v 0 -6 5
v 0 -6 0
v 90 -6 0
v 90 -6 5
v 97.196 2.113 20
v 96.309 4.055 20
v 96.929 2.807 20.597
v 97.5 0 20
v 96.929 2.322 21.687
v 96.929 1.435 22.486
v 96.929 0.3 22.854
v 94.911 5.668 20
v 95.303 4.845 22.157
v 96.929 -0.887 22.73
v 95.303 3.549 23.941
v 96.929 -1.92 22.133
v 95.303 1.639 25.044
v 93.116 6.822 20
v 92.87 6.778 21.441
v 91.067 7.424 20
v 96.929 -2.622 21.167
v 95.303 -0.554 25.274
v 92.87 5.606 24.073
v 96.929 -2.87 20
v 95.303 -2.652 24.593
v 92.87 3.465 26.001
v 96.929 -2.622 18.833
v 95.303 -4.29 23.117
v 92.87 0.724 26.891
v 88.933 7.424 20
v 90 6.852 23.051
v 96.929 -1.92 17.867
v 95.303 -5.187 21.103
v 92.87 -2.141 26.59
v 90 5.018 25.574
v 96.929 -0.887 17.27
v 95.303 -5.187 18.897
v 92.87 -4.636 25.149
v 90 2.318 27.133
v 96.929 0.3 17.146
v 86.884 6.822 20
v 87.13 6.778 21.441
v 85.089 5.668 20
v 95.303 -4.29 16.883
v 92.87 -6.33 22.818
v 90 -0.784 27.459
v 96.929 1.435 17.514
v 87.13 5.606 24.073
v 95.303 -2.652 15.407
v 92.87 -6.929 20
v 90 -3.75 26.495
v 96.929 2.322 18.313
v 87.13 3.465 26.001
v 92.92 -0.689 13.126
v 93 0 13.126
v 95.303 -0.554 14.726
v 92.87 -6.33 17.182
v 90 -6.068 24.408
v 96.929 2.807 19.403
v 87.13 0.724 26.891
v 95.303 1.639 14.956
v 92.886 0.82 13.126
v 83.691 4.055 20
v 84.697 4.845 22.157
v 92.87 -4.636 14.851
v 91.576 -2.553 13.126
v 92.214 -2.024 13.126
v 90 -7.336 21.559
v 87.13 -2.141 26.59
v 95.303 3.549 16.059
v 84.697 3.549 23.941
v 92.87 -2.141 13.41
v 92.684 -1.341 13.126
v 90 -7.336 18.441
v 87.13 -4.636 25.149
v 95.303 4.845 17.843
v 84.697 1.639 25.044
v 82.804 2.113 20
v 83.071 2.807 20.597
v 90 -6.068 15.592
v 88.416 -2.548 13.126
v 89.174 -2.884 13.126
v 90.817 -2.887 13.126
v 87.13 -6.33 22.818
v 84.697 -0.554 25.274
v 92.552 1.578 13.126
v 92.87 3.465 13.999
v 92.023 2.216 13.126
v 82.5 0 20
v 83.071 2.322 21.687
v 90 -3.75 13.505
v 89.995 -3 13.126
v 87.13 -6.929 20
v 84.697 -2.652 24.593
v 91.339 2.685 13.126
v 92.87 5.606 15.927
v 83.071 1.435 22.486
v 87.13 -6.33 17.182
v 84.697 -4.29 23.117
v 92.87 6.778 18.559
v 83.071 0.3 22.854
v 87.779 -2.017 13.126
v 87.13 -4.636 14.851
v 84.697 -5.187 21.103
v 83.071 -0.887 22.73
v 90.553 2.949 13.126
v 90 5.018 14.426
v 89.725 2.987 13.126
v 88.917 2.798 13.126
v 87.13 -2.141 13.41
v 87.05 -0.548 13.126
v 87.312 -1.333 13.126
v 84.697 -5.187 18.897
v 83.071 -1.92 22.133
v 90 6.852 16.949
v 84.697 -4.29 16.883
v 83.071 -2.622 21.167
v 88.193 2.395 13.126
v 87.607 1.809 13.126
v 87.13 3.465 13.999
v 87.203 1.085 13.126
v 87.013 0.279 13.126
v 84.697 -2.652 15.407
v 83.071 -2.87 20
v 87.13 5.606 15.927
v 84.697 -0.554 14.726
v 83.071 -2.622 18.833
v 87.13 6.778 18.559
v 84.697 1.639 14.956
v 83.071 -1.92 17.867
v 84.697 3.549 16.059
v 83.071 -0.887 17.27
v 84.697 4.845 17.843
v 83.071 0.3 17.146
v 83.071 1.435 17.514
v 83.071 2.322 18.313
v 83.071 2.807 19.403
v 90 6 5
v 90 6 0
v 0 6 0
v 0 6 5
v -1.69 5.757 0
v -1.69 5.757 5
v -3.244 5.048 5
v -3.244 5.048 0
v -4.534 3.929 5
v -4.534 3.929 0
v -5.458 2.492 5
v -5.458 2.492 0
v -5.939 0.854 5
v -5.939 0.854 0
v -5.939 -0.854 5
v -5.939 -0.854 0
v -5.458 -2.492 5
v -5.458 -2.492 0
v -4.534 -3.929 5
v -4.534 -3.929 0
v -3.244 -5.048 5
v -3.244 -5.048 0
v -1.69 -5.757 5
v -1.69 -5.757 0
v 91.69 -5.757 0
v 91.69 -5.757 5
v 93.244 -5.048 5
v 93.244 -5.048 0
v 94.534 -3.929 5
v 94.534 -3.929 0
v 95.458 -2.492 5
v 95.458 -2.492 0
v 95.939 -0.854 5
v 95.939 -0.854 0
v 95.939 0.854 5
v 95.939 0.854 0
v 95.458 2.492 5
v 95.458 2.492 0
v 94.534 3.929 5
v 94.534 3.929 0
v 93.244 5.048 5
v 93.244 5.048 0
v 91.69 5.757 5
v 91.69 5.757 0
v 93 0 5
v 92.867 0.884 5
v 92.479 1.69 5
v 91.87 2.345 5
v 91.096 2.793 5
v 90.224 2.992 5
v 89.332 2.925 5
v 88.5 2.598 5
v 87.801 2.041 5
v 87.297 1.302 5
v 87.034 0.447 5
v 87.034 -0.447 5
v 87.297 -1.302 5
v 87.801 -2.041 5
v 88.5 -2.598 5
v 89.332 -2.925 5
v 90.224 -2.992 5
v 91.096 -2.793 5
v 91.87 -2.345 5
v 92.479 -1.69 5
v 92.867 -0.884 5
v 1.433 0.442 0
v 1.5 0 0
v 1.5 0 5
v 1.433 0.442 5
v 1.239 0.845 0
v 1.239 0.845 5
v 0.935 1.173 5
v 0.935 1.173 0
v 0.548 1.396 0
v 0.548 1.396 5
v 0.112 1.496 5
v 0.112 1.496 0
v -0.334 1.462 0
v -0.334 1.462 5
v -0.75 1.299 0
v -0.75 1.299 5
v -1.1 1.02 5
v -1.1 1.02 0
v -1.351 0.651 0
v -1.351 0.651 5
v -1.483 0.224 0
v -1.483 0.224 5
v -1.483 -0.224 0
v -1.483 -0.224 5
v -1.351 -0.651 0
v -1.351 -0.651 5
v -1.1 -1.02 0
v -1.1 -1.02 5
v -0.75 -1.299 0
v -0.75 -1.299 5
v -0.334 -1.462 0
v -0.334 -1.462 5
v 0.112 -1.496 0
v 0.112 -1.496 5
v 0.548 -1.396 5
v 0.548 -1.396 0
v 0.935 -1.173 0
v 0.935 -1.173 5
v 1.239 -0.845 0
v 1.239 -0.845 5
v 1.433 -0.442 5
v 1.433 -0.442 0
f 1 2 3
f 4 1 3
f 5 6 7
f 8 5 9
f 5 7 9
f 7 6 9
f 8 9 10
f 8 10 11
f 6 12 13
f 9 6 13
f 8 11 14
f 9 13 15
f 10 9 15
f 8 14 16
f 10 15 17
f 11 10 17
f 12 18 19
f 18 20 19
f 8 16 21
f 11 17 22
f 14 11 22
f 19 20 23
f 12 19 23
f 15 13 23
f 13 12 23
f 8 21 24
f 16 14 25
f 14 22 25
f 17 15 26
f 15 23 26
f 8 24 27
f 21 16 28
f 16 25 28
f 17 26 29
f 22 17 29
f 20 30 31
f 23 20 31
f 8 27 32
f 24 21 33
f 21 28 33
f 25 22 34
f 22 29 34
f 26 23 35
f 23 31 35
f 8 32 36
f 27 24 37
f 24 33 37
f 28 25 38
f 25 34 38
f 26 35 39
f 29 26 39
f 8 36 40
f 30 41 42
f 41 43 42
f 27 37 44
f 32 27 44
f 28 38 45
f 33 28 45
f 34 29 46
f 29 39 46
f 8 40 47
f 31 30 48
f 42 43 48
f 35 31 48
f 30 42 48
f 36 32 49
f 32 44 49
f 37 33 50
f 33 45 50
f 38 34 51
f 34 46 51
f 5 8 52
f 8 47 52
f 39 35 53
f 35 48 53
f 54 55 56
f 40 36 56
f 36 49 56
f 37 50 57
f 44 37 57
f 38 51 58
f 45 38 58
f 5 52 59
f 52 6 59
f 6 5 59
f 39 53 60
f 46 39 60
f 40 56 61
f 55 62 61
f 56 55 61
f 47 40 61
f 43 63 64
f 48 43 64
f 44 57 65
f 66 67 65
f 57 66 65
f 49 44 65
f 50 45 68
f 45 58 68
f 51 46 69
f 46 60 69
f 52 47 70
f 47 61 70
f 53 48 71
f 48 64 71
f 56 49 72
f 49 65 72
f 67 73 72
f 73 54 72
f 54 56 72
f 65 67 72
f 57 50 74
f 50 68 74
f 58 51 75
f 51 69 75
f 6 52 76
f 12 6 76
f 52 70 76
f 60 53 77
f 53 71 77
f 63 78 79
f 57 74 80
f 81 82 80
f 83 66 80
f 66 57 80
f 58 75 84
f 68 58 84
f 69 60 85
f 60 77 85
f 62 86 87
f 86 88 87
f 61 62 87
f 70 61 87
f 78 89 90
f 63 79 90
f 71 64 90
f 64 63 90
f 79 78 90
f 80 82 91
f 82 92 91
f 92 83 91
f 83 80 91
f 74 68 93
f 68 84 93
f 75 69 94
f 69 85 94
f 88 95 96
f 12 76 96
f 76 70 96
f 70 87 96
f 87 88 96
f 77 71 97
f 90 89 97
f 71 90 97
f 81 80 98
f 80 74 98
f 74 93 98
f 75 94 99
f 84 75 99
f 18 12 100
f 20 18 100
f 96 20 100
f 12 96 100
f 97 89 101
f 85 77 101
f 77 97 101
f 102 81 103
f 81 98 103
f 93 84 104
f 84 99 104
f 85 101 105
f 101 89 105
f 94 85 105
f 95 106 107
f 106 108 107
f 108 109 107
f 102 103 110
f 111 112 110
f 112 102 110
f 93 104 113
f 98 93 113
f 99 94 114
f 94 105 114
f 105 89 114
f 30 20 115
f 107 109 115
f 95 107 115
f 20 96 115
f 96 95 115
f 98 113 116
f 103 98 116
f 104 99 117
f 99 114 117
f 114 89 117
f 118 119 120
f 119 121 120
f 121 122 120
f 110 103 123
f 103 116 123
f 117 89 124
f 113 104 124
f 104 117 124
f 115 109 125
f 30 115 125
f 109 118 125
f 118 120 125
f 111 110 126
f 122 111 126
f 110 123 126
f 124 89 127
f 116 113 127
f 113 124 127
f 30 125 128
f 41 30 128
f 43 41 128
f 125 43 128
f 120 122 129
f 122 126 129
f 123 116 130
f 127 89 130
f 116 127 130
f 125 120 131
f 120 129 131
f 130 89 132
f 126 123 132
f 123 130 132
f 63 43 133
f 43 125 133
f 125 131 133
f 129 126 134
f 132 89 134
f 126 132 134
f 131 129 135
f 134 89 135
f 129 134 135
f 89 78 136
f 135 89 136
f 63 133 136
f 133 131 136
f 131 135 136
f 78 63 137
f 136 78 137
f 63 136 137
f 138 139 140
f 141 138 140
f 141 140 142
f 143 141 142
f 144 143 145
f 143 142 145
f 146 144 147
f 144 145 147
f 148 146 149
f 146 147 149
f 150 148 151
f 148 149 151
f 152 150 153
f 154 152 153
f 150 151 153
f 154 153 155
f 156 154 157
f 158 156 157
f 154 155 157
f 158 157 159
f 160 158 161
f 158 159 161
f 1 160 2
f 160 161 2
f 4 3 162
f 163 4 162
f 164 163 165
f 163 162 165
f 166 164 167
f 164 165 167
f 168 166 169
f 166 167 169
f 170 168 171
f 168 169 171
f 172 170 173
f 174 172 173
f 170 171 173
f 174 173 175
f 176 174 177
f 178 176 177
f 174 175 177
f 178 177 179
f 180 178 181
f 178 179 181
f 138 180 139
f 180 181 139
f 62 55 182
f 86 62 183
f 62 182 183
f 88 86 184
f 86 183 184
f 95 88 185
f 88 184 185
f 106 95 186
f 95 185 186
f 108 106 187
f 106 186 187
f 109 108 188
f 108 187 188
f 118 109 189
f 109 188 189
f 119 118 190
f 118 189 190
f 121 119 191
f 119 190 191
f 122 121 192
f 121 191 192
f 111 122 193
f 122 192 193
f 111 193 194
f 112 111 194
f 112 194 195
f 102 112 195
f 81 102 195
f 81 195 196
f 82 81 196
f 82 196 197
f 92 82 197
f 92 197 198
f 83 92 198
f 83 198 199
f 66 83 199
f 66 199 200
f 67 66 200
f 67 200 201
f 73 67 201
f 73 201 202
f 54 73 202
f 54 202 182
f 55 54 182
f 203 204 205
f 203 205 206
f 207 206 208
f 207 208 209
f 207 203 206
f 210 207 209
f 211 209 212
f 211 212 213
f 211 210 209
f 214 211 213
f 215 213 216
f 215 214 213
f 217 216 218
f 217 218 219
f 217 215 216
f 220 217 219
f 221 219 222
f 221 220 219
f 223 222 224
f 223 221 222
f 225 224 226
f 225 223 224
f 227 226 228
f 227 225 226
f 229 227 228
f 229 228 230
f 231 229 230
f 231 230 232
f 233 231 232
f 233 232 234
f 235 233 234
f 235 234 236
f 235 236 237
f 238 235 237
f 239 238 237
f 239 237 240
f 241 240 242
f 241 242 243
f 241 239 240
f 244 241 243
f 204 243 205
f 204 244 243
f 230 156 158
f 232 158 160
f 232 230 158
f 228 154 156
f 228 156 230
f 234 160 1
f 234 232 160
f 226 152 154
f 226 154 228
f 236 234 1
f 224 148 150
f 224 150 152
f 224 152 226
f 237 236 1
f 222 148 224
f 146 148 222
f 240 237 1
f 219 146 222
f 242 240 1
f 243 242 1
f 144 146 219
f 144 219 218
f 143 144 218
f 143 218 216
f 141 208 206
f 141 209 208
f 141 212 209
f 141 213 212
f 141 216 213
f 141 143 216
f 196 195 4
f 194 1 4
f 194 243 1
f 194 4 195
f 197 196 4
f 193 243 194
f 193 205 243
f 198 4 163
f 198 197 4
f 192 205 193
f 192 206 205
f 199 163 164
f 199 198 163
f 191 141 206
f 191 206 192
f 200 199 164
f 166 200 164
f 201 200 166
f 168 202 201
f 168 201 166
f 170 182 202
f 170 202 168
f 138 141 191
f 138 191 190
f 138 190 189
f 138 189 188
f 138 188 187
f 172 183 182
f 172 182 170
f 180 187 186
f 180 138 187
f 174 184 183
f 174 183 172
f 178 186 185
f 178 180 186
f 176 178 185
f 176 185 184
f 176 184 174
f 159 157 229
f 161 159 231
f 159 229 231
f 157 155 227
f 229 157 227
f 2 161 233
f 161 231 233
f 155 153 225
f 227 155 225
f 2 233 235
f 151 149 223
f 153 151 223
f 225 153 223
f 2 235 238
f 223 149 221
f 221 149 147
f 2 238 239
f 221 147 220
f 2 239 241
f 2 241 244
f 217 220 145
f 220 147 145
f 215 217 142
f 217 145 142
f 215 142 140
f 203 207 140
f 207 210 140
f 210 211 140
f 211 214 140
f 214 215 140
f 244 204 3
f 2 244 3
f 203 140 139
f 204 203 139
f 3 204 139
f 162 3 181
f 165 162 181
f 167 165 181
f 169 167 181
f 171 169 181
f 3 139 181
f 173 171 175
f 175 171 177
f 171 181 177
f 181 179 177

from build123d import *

# Parameters (mm, degrees)
SKETCH1_R           = 1.5
BOSS_EXTRUDE1_DEPTH = 5
FILLET3_R           = 1
BOSS_EXTRUDE2_START = -5
SKETCH2_R           = 3
BOSS_EXTRUDE2_DEPTH = 20


with BuildPart() as part:
    # Sketch1 → Boss-Extrude1 (new body)
    with BuildSketch(Plane.XY):
        with BuildLine():
            ThreePointArc((0, 6), (-6, 0), (0, -6))
            Line((0, -6), (90, -6))
            ThreePointArc((90, -6), (96, 0), (90, 6))
            Line((90, 6), (0, 6))
        make_face()
        Circle(SKETCH1_R, mode=Mode.SUBTRACT)
        with Locations((90, 0)):
            Circle(SKETCH1_R, mode=Mode.SUBTRACT)
    extrude(amount=BOSS_EXTRUDE1_DEPTH)

    # Fillet3
    fillet3_edges = [part.edges().sort_by_distance(p)[0] for p in [
        (88.5, 0, 0),
    ]]
    fillet(fillet3_edges, radius=FILLET3_R)

    # Sketch2 → Boss-Extrude2 (add)
    with BuildSketch(Plane.XY.offset(5).offset(BOSS_EXTRUDE2_START)):
        with Locations((90, 0)):
            Circle(SKETCH2_R)
    extrude(amount=BOSS_EXTRUDE2_DEPTH)

    # Sketch3 → Revolve1 (revolve)
    with BuildSketch(Plane.XY.offset(20)):
        with BuildLine():
            Line((82.5, 0), (97.5, 0))
            ThreePointArc((97.5, 0), (90, 7.5), (82.5, 0))
        make_face()
    revolve(axis=Axis((90, 0, 20), (1, 0, 0)))


solid = part.part
